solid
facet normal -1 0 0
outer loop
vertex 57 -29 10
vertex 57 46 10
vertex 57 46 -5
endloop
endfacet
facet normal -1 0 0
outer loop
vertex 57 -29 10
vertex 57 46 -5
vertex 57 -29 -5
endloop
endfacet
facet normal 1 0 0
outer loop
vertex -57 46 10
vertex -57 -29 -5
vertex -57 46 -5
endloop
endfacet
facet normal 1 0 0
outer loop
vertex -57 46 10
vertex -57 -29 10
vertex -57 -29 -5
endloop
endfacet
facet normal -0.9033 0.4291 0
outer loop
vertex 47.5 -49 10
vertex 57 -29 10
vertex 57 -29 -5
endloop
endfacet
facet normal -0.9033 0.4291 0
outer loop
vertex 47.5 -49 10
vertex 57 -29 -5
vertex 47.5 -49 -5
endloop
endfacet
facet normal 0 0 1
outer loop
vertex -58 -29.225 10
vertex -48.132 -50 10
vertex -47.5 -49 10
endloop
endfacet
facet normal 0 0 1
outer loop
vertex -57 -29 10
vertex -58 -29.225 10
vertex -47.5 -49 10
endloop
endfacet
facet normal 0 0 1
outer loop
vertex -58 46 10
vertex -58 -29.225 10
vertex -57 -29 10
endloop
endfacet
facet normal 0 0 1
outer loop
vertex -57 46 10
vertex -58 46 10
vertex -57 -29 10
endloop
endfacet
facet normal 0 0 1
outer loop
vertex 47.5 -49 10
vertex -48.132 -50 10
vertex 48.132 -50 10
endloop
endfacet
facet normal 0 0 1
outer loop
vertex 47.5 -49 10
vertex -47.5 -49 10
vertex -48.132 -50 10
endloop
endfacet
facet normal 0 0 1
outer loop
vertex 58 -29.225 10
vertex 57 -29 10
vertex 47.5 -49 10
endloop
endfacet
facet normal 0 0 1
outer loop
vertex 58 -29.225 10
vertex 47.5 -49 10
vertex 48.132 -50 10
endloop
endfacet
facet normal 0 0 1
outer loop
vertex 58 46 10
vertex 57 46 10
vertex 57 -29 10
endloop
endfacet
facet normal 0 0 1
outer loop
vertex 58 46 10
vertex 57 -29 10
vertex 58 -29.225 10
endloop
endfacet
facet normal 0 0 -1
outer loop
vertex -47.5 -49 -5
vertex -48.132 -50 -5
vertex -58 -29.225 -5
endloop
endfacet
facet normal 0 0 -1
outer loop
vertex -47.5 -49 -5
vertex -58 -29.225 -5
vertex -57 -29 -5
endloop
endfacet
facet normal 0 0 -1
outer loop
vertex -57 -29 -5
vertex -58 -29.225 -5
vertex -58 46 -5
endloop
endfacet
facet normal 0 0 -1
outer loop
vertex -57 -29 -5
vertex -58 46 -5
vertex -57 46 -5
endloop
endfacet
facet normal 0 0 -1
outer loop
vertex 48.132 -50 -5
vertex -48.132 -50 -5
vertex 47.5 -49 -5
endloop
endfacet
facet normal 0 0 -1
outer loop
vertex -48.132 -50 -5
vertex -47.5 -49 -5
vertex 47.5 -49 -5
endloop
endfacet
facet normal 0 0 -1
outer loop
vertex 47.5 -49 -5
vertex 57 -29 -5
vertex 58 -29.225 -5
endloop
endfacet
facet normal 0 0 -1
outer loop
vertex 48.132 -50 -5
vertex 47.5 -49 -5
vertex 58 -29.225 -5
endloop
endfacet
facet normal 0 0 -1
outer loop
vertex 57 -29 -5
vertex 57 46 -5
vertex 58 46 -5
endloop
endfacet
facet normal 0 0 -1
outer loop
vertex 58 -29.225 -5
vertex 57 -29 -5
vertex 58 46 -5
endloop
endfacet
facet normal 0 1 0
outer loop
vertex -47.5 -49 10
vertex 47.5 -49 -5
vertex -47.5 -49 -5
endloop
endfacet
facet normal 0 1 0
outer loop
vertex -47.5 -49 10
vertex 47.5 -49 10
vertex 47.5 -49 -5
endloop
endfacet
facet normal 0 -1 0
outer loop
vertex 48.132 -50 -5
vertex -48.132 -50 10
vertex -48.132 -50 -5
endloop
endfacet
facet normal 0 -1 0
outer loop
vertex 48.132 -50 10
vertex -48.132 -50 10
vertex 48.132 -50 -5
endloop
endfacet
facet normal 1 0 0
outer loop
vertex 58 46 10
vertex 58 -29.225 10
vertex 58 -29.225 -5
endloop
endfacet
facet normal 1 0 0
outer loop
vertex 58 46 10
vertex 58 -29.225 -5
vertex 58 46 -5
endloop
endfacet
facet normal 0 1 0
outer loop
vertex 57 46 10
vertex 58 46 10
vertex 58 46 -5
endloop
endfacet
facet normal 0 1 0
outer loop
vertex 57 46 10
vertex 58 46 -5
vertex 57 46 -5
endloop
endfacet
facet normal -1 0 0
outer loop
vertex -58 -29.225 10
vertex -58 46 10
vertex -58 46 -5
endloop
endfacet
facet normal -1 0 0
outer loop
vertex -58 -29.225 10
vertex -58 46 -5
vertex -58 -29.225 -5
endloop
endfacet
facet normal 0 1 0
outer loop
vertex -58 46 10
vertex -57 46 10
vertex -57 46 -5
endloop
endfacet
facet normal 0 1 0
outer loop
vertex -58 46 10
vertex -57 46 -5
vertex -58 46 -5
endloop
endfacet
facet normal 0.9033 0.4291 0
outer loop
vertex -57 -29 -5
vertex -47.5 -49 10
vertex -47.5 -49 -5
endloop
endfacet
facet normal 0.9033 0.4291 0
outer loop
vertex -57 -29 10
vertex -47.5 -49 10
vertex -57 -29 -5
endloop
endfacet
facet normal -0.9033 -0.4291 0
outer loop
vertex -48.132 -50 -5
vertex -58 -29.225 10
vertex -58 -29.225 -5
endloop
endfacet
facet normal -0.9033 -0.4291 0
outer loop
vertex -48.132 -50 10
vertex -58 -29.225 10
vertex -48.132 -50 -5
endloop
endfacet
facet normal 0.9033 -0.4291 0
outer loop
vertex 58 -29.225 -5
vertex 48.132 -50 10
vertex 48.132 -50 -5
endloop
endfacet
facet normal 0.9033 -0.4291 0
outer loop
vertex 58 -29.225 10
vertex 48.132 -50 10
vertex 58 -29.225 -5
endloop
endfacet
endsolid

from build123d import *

# Parameters (mm, degrees)
F1_DEPTH      = 10
F1_DEPTH_BACK = 5


with BuildPart() as f1:
    # F0 (on Top) → F1 (new body, two sides)
    with BuildSketch(Plane.XY) as f1_sk:
        Polygon((-57, -29), (-57, 46), (-58, 46), (-58, -29.225431), (-48.132079, -50), (48.132079, -50), (58, -29.225431), (58, 46), (57, 46), (57, -29), (47.5, -49), (-47.5, -49), align=None)
    extrude(amount=F1_DEPTH)
    extrude(f1_sk.sketch, amount=-F1_DEPTH_BACK)


solid = f1.part
